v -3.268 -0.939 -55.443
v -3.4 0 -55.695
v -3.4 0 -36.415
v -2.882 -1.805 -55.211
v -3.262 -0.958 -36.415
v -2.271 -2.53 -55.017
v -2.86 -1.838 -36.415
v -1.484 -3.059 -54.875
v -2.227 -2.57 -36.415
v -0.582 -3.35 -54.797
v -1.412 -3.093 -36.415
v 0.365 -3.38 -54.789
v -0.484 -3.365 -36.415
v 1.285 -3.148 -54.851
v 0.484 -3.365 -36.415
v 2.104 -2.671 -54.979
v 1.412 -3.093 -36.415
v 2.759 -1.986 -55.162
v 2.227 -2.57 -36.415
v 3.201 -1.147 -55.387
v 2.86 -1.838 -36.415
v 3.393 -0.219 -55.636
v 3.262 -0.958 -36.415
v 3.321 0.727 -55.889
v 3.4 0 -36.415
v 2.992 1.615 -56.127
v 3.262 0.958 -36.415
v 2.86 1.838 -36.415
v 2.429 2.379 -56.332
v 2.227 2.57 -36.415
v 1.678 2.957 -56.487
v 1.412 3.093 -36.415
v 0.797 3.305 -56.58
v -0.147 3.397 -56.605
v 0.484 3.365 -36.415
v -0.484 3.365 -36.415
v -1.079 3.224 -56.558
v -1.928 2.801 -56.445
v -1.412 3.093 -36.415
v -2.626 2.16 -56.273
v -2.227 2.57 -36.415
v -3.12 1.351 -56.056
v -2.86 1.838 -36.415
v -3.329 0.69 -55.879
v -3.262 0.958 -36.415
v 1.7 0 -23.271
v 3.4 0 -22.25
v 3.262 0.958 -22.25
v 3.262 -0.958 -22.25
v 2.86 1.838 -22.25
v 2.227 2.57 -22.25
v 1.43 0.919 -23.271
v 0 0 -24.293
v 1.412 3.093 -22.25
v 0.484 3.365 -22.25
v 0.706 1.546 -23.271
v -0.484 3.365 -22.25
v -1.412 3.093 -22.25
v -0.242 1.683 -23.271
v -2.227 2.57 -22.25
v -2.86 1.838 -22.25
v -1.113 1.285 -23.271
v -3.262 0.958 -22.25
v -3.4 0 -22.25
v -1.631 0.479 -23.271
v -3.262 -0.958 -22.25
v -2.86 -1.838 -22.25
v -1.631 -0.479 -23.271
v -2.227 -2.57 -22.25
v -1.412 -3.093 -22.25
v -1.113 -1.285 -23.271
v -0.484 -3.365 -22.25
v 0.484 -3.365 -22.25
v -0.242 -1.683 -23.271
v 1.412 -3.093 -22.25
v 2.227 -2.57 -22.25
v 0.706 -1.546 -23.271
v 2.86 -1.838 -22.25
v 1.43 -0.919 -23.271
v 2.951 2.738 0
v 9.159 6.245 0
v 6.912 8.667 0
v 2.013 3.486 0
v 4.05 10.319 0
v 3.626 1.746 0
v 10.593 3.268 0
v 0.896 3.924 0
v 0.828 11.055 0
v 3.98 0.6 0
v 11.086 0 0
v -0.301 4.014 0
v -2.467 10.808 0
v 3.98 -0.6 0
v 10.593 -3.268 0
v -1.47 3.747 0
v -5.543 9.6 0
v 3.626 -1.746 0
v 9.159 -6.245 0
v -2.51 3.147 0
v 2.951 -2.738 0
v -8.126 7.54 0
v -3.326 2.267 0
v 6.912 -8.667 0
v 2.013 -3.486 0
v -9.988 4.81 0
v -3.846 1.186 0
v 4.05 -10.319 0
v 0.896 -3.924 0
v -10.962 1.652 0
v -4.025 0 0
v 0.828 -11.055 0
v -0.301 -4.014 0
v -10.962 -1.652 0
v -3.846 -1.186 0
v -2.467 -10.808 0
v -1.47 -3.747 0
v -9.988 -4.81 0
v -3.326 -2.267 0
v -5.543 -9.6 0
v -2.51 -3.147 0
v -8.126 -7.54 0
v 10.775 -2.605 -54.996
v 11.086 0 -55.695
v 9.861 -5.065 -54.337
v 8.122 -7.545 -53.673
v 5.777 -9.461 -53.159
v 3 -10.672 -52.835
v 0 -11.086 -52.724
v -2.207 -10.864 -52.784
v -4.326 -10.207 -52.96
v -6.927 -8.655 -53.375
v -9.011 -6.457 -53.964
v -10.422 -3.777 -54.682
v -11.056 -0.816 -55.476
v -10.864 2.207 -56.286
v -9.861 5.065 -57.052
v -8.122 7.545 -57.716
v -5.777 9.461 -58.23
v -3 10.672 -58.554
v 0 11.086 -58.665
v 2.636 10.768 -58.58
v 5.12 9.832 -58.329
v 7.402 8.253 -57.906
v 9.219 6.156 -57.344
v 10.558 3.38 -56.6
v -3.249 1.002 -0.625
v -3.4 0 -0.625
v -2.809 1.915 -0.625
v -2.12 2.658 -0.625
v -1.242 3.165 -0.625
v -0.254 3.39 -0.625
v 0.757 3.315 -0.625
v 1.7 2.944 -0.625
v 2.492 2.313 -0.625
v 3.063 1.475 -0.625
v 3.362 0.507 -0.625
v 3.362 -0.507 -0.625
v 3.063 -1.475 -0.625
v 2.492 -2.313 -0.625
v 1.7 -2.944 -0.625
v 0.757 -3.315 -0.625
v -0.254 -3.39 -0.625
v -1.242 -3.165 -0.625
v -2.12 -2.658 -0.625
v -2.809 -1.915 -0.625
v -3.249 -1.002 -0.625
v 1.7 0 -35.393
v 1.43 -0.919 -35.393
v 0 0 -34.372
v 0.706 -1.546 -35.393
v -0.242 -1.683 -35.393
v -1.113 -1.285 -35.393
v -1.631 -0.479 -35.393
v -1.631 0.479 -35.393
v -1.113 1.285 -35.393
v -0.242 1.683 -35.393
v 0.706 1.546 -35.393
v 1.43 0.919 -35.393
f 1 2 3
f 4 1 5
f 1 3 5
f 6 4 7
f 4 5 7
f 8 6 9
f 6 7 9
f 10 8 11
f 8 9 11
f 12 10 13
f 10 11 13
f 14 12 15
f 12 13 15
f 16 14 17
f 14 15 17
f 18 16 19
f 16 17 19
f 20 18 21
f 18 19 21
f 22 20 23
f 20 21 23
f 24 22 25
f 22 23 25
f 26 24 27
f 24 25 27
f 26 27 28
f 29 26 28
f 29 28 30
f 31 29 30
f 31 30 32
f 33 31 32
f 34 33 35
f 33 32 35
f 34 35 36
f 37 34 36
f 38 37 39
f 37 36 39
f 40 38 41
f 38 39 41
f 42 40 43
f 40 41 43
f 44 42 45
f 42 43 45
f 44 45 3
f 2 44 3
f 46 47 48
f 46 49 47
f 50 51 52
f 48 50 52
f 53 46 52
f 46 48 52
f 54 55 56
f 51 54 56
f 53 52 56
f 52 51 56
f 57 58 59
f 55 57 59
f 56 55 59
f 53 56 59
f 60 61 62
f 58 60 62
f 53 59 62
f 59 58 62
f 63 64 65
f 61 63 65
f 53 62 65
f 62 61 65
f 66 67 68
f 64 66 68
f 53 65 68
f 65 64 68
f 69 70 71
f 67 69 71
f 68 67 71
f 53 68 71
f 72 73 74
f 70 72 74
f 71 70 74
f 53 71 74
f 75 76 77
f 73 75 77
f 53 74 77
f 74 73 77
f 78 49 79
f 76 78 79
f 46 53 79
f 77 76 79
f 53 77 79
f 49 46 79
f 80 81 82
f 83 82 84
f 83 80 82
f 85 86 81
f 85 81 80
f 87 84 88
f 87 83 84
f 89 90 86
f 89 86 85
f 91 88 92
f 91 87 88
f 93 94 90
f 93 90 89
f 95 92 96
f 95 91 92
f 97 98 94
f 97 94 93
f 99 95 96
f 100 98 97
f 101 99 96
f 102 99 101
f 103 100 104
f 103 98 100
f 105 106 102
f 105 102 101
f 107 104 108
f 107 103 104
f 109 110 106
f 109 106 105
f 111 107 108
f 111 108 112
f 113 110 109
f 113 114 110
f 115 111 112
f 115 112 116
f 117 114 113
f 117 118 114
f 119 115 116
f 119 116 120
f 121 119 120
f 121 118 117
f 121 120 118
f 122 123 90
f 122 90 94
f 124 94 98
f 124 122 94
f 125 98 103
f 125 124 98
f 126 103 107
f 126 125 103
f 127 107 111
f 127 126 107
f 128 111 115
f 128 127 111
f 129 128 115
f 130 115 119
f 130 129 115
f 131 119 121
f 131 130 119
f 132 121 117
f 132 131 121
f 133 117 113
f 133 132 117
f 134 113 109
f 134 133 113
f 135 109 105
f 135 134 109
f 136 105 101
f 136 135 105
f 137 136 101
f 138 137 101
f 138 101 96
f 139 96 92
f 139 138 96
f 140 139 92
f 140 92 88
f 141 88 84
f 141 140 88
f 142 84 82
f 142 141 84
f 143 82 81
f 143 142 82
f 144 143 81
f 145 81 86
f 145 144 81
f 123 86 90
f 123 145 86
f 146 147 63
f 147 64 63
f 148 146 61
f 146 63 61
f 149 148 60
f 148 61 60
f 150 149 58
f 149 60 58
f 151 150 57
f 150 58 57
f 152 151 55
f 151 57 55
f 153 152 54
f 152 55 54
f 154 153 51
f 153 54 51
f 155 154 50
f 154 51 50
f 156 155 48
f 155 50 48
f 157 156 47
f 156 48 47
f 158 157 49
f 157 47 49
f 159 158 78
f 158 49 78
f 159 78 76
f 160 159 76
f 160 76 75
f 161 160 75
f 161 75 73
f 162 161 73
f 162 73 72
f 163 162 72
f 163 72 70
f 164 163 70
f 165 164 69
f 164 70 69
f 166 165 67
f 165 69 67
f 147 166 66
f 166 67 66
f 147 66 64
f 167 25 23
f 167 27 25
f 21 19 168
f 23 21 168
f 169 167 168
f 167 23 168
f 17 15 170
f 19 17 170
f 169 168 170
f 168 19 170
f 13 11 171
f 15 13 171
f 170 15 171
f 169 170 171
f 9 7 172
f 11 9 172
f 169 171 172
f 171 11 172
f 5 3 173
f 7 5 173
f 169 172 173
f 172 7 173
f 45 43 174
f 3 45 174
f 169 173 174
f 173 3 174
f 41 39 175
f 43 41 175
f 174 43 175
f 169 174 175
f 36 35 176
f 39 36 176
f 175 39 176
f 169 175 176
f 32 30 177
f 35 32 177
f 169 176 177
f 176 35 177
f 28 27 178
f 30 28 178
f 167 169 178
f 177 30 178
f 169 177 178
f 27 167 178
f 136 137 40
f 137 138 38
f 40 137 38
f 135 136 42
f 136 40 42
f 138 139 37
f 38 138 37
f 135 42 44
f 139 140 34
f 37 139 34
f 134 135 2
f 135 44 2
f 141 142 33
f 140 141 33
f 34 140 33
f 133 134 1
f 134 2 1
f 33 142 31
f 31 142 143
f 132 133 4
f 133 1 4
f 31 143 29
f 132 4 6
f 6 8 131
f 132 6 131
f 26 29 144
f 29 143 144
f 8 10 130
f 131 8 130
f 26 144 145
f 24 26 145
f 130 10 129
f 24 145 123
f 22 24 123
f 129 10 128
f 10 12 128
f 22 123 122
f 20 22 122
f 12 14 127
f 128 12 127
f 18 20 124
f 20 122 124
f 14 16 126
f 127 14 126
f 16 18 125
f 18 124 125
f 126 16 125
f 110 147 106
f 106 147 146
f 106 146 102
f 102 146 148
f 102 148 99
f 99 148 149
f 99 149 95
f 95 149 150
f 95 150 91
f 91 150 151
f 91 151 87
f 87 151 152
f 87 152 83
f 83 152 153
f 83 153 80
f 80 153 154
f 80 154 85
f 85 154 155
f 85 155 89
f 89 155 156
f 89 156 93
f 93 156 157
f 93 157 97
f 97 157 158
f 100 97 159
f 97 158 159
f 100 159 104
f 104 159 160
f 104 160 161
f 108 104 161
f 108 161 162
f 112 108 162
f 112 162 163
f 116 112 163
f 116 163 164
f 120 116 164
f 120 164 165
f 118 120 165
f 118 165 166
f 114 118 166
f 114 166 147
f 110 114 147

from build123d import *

# Parameters (mm, degrees)
SKIZZE1_W                       = 58.664904562
SKIZZE1_H                       = 11.08559322
SCHNITT_LINEAR_AUSTRAGEN1_DEPTH = 13
M8_GEWINDEBOHRUNG1_D            = 6.8
M8_GEWINDEBOHRUNG1_DEPTH        = 22.25
M8_GEWINDEBOHRUNG1_CSINK_D      = 8.05
M8_GEWINDEBOHRUNG1_CSINK_ANGLE  = 90
M8_GEWINDEBOHRUNG1_TIP          = 2.042926105
M8_GEWINDEBOHRUNG2_D            = 6.8
M8_GEWINDEBOHRUNG2_DEPTH        = 22.25
M8_GEWINDEBOHRUNG2_CSINK_D      = 8.05
M8_GEWINDEBOHRUNG2_CSINK_ANGLE  = 90
M8_GEWINDEBOHRUNG2_TIP          = 2.042926105


with BuildPart() as part:
    # Skizze1 → Rotation1 (revolve)
    with BuildSketch(Plane(origin=(0, 0, 0), x_dir=(0, 0, -1), z_dir=(1, 0, 0)), mode=Mode.PRIVATE) as rotation1_sk:
        with Locations((29.332452281, 5.54279661)):
            Rectangle(SKIZZE1_W, SKIZZE1_H)
    revolve(rotation1_sk.sketch.rotate(Axis((0, 0, 0), (0, 0, -1)), 90), axis=Axis((0, 0, 0), (0, 0, -1)))  # turned: the seam where the file's is

    # Skizze2 → Schnitt-Linear austragen1 (cut, symmetric)
    with BuildSketch(Plane(origin=(0, 0, 0), x_dir=(0, 0, -1), z_dir=(1, 0, 0))):
        Polygon((58.664904562, 11.08559322), (52.72415306, -11.08559322), (58.664904562, -11.08559322), align=None)
    extrude(amount=SCHNITT_LINEAR_AUSTRAGEN1_DEPTH, both=True, mode=Mode.SUBTRACT)

    # M8 Gewindebohrung1
    with Locations(Plane.XY):
        with Locations((0, 0)):
            CounterSinkHole(M8_GEWINDEBOHRUNG1_D / 2, M8_GEWINDEBOHRUNG1_CSINK_D / 2, depth=M8_GEWINDEBOHRUNG1_DEPTH, counter_sink_angle=M8_GEWINDEBOHRUNG1_CSINK_ANGLE)
            with Locations((0, 0, -(M8_GEWINDEBOHRUNG1_DEPTH + M8_GEWINDEBOHRUNG1_TIP / 2))):  # 118° drill point
                Cone(0, M8_GEWINDEBOHRUNG1_D / 2, M8_GEWINDEBOHRUNG1_TIP, mode=Mode.SUBTRACT)

    # M8 Gewindebohrung2
    with Locations(Plane(origin=(0, 0, -58.664904562), x_dir=(1, 0, 0), z_dir=(0, 0, -1))):
        with Locations((0, 0)):
            CounterSinkHole(M8_GEWINDEBOHRUNG2_D / 2, M8_GEWINDEBOHRUNG2_CSINK_D / 2, depth=M8_GEWINDEBOHRUNG2_DEPTH, counter_sink_angle=M8_GEWINDEBOHRUNG2_CSINK_ANGLE)
            with Locations((0, 0, -(M8_GEWINDEBOHRUNG2_DEPTH + M8_GEWINDEBOHRUNG2_TIP / 2))):  # 118° drill point
                Cone(0, M8_GEWINDEBOHRUNG2_D / 2, M8_GEWINDEBOHRUNG2_TIP, mode=Mode.SUBTRACT)


solid = part.part
